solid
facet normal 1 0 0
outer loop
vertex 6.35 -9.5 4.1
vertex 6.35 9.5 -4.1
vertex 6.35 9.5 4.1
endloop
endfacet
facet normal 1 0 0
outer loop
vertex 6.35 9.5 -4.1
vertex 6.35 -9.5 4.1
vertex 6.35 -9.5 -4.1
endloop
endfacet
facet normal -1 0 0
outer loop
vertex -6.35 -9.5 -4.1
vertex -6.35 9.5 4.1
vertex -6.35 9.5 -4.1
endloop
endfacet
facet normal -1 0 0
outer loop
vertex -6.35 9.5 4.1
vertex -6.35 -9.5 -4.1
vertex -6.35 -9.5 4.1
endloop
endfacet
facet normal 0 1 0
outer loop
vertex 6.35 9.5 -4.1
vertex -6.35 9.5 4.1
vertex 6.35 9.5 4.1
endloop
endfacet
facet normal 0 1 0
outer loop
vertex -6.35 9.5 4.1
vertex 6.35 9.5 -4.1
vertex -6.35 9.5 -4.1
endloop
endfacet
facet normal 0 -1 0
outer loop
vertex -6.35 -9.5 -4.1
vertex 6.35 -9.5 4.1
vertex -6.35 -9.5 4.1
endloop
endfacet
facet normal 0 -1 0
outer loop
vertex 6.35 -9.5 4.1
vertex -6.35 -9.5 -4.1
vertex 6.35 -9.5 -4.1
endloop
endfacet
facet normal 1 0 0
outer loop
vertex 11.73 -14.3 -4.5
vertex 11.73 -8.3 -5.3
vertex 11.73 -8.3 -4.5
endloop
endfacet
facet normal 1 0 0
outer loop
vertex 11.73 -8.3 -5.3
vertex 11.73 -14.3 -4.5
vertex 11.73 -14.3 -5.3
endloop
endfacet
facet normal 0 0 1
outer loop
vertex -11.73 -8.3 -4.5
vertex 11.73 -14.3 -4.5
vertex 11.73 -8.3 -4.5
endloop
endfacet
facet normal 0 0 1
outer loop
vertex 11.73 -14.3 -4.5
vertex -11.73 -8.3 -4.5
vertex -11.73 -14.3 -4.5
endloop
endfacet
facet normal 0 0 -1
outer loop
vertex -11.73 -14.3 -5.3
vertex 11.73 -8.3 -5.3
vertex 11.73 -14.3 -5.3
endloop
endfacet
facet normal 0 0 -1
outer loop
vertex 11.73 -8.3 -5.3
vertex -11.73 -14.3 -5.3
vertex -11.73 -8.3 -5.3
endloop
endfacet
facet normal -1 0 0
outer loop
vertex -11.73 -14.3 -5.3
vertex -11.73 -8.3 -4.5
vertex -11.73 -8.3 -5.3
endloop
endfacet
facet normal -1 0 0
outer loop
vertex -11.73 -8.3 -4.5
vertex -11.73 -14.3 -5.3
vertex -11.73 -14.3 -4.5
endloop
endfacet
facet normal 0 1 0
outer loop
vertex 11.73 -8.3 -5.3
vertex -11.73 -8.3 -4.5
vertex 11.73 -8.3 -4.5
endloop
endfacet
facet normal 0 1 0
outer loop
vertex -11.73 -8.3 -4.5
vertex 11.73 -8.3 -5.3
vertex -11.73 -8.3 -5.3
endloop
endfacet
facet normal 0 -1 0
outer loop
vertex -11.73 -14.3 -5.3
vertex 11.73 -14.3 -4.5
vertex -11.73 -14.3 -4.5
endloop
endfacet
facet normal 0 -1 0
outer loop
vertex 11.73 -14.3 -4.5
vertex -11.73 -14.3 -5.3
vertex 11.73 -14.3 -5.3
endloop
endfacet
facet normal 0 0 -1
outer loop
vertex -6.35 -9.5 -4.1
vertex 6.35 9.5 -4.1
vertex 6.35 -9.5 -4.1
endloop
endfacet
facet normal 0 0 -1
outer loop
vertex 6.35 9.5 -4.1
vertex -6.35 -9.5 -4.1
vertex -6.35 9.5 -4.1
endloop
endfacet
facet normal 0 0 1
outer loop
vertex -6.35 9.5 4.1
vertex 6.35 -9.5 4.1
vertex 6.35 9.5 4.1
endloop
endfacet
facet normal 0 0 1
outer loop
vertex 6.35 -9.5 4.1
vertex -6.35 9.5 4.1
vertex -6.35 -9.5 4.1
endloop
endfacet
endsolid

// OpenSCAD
// Simplified, connected 7‑segment display block with overall envelope [12.7, 19, 8.2]
// Fix: semantic mismatch -> adds 7 distinct segment bars in standard layout.
// Fix: connectivity -> all translate() values are formula-based and include slight overlap.
// Result: single connected solid, recognizable 7-segment silhouette.

$fn = 48;

// Overall envelope (requested)
body_W = 12.7;
body_H = 19;
body_D = 8.2;

// Connection overlap (1–2mm)
overlap = 1.2;

// Bezel / face
bezel_margin = 1.0;
bezel_thickness = 0.8;

// Segment geometry (raised bars on the face)
segment_inset_margin = 2.0;     // keeps segments away from bezel
segment_raise = 0.8;            // how far segments protrude from face
segment_th = 1.6;               // segment bar thickness (in XY plane)
segment_gap = 1.2;              // gap between top/middle/bottom and verticals

// Decimal point (kept simple, connected)
decimal_r = 0.9;
decimal_h = 0.8;

// Leads (kept simple, connected)
lead_count = 10;
lead_pitch = 2.54;
lead_W = 0.6;
lead_T = 0.5;
lead_L = 6.0;
lead_bar_T = 0.8;

// Mount bosses (kept simple, connected)
mount_boss_r = 1.2;
mount_boss_h = 1.2;

// ---------- Base Shapes ----------
module display_body() {
  cube([body_W, body_H, body_D], center=true);
}

module front_bezel_outer() {
  // Touches body front with overlap
  translate([0, 0, body_D/2 + bezel_thickness/2 - overlap])
    cube([body_W, body_H, bezel_thickness], center=true);
}

module front_bezel_inner_cut() {
  // Cut window through bezel only (slightly deeper for clean boolean)
  translate([0, 0, body_D/2 + bezel_thickness/2 - overlap])
    cube([body_W - 2*bezel_margin, body_H - 2*bezel_margin, bezel_thickness + 2*overlap], center=true);
}

module front_bezel_detail() {
  difference() {
    front_bezel_outer();
    front_bezel_inner_cut();
  }
}

// ---------- 7-Segment Bars (raised, connected to bezel) ----------
module seg_bar_h(len, th, h) cube([len, th, h], center=true);
module seg_bar_v(th, len, h) cube([th, len, h], center=true);

module seven_segments() {
  // Available inner window for segments
  inner_W = body_W - 2*segment_inset_margin;
  inner_H = body_H - 2*segment_inset_margin;

  // Segment lengths (simple proportions)
  hlen = max(1, inner_W - 2*segment_th);
  vlen = max(1, (inner_H - 3*segment_th - 2*segment_gap)/2);

  // Z placement: sit on bezel front with overlap so it's one solid
  z_seg = body_D/2 + segment_raise/2 - overlap;

  // Y positions for top/middle/bottom
  y_top =  inner_H/2 - segment_th/2;
  y_mid =  0;
  y_bot = -inner_H/2 + segment_th/2;

  // X positions for left/right verticals
  x_left  = -inner_W/2 + segment_th/2;
  x_right =  inner_W/2 - segment_th/2;

  // Y centers for upper/lower verticals
  y_upper =  (segment_th + segment_gap)/2 + vlen/2;
  y_lower = -(segment_th + segment_gap)/2 - vlen/2;

  union() {
    // a (top)
    translate([0, y_top, z_seg]) seg_bar_h(hlen, segment_th, segment_raise);
    // g (middle)
    translate([0, y_mid, z_seg]) seg_bar_h(hlen, segment_th, segment_raise);
    // d (bottom)
    translate([0, y_bot, z_seg]) seg_bar_h(hlen, segment_th, segment_raise);

    // f (upper-left)
    translate([x_left,  y_upper, z_seg]) seg_bar_v(segment_th, vlen, segment_raise);
    // b (upper-right)
    translate([x_right, y_upper, z_seg]) seg_bar_v(segment_th, vlen, segment_raise);

    // e (lower-left)
    translate([x_left,  y_lower, z_seg]) seg_bar_v(segment_th, vlen, segment_raise);
    // c (lower-right)
    translate([x_right, y_lower, z_seg]) seg_bar_v(segment_th, vlen, segment_raise);
  }
}

module decimal_point() {
  // Place on lower-right of inner window; connect to bezel with overlap
  inner_W = body_W - 2*segment_inset_margin;
  inner_H = body_H - 2*segment_inset_margin;

  z_dp = body_D/2 + decimal_h/2 - overlap;
  x_dp =  inner_W/2 - decimal_r;
  y_dp = -inner_H/2 + decimal_r;

  translate([x_dp, y_dp, z_dp])
    cylinder(r=decimal_r, h=decimal_h, center=true);
}

// ---------- Leads / Mounting (connected) ----------
module pin_leads_bar() {
  // Bar touches body bottom with overlap
  translate([0,
             -body_H/2 - lead_L/2 + overlap,
             -body_D/2 + lead_bar_T/2 - overlap])
    cube([lead_pitch*(lead_count-1) + lead_W, lead_L, lead_bar_T], center=true);
}

module pin_leads_comb() {
  // Thin comb plate coincident with bar (connected)
  translate([0,
             -body_H/2 - lead_L/2 + overlap,
             -body_D/2 + lead_T/2 - overlap])
    cube([lead_pitch*(lead_count-1) + lead_W, lead_L, lead_T], center=true);
}

module pin_leads() {
  union() {
    pin_leads_bar();
    pin_leads_comb();
  }
}

module mount_boss_left() {
  // Touches body bottom with overlap
  translate([-body_W/2 + mount_boss_r + bezel_margin,
             0,
             -body_D/2 - mount_boss_h/2 + overlap])
    cylinder(r=mount_boss_r, h=mount_boss_h, center=true);
}

module mount_boss_right() {
  translate([ body_W/2 - mount_boss_r - bezel_margin,
              0,
             -body_D/2 - mount_boss_h/2 + overlap])
    cylinder(r=mount_boss_r, h=mount_boss_h, center=true);
}

module mounting_features() {
  union() {
    mount_boss_left();
    mount_boss_right();
  }
}

// ---------- Final Model (single connected solid) ----------
module complete_model() {
  union() {
    display_body();
    front_bezel_detail();
    seven_segments();
    decimal_point();
    pin_leads();
    mounting_features();
  }
}

complete_model();
